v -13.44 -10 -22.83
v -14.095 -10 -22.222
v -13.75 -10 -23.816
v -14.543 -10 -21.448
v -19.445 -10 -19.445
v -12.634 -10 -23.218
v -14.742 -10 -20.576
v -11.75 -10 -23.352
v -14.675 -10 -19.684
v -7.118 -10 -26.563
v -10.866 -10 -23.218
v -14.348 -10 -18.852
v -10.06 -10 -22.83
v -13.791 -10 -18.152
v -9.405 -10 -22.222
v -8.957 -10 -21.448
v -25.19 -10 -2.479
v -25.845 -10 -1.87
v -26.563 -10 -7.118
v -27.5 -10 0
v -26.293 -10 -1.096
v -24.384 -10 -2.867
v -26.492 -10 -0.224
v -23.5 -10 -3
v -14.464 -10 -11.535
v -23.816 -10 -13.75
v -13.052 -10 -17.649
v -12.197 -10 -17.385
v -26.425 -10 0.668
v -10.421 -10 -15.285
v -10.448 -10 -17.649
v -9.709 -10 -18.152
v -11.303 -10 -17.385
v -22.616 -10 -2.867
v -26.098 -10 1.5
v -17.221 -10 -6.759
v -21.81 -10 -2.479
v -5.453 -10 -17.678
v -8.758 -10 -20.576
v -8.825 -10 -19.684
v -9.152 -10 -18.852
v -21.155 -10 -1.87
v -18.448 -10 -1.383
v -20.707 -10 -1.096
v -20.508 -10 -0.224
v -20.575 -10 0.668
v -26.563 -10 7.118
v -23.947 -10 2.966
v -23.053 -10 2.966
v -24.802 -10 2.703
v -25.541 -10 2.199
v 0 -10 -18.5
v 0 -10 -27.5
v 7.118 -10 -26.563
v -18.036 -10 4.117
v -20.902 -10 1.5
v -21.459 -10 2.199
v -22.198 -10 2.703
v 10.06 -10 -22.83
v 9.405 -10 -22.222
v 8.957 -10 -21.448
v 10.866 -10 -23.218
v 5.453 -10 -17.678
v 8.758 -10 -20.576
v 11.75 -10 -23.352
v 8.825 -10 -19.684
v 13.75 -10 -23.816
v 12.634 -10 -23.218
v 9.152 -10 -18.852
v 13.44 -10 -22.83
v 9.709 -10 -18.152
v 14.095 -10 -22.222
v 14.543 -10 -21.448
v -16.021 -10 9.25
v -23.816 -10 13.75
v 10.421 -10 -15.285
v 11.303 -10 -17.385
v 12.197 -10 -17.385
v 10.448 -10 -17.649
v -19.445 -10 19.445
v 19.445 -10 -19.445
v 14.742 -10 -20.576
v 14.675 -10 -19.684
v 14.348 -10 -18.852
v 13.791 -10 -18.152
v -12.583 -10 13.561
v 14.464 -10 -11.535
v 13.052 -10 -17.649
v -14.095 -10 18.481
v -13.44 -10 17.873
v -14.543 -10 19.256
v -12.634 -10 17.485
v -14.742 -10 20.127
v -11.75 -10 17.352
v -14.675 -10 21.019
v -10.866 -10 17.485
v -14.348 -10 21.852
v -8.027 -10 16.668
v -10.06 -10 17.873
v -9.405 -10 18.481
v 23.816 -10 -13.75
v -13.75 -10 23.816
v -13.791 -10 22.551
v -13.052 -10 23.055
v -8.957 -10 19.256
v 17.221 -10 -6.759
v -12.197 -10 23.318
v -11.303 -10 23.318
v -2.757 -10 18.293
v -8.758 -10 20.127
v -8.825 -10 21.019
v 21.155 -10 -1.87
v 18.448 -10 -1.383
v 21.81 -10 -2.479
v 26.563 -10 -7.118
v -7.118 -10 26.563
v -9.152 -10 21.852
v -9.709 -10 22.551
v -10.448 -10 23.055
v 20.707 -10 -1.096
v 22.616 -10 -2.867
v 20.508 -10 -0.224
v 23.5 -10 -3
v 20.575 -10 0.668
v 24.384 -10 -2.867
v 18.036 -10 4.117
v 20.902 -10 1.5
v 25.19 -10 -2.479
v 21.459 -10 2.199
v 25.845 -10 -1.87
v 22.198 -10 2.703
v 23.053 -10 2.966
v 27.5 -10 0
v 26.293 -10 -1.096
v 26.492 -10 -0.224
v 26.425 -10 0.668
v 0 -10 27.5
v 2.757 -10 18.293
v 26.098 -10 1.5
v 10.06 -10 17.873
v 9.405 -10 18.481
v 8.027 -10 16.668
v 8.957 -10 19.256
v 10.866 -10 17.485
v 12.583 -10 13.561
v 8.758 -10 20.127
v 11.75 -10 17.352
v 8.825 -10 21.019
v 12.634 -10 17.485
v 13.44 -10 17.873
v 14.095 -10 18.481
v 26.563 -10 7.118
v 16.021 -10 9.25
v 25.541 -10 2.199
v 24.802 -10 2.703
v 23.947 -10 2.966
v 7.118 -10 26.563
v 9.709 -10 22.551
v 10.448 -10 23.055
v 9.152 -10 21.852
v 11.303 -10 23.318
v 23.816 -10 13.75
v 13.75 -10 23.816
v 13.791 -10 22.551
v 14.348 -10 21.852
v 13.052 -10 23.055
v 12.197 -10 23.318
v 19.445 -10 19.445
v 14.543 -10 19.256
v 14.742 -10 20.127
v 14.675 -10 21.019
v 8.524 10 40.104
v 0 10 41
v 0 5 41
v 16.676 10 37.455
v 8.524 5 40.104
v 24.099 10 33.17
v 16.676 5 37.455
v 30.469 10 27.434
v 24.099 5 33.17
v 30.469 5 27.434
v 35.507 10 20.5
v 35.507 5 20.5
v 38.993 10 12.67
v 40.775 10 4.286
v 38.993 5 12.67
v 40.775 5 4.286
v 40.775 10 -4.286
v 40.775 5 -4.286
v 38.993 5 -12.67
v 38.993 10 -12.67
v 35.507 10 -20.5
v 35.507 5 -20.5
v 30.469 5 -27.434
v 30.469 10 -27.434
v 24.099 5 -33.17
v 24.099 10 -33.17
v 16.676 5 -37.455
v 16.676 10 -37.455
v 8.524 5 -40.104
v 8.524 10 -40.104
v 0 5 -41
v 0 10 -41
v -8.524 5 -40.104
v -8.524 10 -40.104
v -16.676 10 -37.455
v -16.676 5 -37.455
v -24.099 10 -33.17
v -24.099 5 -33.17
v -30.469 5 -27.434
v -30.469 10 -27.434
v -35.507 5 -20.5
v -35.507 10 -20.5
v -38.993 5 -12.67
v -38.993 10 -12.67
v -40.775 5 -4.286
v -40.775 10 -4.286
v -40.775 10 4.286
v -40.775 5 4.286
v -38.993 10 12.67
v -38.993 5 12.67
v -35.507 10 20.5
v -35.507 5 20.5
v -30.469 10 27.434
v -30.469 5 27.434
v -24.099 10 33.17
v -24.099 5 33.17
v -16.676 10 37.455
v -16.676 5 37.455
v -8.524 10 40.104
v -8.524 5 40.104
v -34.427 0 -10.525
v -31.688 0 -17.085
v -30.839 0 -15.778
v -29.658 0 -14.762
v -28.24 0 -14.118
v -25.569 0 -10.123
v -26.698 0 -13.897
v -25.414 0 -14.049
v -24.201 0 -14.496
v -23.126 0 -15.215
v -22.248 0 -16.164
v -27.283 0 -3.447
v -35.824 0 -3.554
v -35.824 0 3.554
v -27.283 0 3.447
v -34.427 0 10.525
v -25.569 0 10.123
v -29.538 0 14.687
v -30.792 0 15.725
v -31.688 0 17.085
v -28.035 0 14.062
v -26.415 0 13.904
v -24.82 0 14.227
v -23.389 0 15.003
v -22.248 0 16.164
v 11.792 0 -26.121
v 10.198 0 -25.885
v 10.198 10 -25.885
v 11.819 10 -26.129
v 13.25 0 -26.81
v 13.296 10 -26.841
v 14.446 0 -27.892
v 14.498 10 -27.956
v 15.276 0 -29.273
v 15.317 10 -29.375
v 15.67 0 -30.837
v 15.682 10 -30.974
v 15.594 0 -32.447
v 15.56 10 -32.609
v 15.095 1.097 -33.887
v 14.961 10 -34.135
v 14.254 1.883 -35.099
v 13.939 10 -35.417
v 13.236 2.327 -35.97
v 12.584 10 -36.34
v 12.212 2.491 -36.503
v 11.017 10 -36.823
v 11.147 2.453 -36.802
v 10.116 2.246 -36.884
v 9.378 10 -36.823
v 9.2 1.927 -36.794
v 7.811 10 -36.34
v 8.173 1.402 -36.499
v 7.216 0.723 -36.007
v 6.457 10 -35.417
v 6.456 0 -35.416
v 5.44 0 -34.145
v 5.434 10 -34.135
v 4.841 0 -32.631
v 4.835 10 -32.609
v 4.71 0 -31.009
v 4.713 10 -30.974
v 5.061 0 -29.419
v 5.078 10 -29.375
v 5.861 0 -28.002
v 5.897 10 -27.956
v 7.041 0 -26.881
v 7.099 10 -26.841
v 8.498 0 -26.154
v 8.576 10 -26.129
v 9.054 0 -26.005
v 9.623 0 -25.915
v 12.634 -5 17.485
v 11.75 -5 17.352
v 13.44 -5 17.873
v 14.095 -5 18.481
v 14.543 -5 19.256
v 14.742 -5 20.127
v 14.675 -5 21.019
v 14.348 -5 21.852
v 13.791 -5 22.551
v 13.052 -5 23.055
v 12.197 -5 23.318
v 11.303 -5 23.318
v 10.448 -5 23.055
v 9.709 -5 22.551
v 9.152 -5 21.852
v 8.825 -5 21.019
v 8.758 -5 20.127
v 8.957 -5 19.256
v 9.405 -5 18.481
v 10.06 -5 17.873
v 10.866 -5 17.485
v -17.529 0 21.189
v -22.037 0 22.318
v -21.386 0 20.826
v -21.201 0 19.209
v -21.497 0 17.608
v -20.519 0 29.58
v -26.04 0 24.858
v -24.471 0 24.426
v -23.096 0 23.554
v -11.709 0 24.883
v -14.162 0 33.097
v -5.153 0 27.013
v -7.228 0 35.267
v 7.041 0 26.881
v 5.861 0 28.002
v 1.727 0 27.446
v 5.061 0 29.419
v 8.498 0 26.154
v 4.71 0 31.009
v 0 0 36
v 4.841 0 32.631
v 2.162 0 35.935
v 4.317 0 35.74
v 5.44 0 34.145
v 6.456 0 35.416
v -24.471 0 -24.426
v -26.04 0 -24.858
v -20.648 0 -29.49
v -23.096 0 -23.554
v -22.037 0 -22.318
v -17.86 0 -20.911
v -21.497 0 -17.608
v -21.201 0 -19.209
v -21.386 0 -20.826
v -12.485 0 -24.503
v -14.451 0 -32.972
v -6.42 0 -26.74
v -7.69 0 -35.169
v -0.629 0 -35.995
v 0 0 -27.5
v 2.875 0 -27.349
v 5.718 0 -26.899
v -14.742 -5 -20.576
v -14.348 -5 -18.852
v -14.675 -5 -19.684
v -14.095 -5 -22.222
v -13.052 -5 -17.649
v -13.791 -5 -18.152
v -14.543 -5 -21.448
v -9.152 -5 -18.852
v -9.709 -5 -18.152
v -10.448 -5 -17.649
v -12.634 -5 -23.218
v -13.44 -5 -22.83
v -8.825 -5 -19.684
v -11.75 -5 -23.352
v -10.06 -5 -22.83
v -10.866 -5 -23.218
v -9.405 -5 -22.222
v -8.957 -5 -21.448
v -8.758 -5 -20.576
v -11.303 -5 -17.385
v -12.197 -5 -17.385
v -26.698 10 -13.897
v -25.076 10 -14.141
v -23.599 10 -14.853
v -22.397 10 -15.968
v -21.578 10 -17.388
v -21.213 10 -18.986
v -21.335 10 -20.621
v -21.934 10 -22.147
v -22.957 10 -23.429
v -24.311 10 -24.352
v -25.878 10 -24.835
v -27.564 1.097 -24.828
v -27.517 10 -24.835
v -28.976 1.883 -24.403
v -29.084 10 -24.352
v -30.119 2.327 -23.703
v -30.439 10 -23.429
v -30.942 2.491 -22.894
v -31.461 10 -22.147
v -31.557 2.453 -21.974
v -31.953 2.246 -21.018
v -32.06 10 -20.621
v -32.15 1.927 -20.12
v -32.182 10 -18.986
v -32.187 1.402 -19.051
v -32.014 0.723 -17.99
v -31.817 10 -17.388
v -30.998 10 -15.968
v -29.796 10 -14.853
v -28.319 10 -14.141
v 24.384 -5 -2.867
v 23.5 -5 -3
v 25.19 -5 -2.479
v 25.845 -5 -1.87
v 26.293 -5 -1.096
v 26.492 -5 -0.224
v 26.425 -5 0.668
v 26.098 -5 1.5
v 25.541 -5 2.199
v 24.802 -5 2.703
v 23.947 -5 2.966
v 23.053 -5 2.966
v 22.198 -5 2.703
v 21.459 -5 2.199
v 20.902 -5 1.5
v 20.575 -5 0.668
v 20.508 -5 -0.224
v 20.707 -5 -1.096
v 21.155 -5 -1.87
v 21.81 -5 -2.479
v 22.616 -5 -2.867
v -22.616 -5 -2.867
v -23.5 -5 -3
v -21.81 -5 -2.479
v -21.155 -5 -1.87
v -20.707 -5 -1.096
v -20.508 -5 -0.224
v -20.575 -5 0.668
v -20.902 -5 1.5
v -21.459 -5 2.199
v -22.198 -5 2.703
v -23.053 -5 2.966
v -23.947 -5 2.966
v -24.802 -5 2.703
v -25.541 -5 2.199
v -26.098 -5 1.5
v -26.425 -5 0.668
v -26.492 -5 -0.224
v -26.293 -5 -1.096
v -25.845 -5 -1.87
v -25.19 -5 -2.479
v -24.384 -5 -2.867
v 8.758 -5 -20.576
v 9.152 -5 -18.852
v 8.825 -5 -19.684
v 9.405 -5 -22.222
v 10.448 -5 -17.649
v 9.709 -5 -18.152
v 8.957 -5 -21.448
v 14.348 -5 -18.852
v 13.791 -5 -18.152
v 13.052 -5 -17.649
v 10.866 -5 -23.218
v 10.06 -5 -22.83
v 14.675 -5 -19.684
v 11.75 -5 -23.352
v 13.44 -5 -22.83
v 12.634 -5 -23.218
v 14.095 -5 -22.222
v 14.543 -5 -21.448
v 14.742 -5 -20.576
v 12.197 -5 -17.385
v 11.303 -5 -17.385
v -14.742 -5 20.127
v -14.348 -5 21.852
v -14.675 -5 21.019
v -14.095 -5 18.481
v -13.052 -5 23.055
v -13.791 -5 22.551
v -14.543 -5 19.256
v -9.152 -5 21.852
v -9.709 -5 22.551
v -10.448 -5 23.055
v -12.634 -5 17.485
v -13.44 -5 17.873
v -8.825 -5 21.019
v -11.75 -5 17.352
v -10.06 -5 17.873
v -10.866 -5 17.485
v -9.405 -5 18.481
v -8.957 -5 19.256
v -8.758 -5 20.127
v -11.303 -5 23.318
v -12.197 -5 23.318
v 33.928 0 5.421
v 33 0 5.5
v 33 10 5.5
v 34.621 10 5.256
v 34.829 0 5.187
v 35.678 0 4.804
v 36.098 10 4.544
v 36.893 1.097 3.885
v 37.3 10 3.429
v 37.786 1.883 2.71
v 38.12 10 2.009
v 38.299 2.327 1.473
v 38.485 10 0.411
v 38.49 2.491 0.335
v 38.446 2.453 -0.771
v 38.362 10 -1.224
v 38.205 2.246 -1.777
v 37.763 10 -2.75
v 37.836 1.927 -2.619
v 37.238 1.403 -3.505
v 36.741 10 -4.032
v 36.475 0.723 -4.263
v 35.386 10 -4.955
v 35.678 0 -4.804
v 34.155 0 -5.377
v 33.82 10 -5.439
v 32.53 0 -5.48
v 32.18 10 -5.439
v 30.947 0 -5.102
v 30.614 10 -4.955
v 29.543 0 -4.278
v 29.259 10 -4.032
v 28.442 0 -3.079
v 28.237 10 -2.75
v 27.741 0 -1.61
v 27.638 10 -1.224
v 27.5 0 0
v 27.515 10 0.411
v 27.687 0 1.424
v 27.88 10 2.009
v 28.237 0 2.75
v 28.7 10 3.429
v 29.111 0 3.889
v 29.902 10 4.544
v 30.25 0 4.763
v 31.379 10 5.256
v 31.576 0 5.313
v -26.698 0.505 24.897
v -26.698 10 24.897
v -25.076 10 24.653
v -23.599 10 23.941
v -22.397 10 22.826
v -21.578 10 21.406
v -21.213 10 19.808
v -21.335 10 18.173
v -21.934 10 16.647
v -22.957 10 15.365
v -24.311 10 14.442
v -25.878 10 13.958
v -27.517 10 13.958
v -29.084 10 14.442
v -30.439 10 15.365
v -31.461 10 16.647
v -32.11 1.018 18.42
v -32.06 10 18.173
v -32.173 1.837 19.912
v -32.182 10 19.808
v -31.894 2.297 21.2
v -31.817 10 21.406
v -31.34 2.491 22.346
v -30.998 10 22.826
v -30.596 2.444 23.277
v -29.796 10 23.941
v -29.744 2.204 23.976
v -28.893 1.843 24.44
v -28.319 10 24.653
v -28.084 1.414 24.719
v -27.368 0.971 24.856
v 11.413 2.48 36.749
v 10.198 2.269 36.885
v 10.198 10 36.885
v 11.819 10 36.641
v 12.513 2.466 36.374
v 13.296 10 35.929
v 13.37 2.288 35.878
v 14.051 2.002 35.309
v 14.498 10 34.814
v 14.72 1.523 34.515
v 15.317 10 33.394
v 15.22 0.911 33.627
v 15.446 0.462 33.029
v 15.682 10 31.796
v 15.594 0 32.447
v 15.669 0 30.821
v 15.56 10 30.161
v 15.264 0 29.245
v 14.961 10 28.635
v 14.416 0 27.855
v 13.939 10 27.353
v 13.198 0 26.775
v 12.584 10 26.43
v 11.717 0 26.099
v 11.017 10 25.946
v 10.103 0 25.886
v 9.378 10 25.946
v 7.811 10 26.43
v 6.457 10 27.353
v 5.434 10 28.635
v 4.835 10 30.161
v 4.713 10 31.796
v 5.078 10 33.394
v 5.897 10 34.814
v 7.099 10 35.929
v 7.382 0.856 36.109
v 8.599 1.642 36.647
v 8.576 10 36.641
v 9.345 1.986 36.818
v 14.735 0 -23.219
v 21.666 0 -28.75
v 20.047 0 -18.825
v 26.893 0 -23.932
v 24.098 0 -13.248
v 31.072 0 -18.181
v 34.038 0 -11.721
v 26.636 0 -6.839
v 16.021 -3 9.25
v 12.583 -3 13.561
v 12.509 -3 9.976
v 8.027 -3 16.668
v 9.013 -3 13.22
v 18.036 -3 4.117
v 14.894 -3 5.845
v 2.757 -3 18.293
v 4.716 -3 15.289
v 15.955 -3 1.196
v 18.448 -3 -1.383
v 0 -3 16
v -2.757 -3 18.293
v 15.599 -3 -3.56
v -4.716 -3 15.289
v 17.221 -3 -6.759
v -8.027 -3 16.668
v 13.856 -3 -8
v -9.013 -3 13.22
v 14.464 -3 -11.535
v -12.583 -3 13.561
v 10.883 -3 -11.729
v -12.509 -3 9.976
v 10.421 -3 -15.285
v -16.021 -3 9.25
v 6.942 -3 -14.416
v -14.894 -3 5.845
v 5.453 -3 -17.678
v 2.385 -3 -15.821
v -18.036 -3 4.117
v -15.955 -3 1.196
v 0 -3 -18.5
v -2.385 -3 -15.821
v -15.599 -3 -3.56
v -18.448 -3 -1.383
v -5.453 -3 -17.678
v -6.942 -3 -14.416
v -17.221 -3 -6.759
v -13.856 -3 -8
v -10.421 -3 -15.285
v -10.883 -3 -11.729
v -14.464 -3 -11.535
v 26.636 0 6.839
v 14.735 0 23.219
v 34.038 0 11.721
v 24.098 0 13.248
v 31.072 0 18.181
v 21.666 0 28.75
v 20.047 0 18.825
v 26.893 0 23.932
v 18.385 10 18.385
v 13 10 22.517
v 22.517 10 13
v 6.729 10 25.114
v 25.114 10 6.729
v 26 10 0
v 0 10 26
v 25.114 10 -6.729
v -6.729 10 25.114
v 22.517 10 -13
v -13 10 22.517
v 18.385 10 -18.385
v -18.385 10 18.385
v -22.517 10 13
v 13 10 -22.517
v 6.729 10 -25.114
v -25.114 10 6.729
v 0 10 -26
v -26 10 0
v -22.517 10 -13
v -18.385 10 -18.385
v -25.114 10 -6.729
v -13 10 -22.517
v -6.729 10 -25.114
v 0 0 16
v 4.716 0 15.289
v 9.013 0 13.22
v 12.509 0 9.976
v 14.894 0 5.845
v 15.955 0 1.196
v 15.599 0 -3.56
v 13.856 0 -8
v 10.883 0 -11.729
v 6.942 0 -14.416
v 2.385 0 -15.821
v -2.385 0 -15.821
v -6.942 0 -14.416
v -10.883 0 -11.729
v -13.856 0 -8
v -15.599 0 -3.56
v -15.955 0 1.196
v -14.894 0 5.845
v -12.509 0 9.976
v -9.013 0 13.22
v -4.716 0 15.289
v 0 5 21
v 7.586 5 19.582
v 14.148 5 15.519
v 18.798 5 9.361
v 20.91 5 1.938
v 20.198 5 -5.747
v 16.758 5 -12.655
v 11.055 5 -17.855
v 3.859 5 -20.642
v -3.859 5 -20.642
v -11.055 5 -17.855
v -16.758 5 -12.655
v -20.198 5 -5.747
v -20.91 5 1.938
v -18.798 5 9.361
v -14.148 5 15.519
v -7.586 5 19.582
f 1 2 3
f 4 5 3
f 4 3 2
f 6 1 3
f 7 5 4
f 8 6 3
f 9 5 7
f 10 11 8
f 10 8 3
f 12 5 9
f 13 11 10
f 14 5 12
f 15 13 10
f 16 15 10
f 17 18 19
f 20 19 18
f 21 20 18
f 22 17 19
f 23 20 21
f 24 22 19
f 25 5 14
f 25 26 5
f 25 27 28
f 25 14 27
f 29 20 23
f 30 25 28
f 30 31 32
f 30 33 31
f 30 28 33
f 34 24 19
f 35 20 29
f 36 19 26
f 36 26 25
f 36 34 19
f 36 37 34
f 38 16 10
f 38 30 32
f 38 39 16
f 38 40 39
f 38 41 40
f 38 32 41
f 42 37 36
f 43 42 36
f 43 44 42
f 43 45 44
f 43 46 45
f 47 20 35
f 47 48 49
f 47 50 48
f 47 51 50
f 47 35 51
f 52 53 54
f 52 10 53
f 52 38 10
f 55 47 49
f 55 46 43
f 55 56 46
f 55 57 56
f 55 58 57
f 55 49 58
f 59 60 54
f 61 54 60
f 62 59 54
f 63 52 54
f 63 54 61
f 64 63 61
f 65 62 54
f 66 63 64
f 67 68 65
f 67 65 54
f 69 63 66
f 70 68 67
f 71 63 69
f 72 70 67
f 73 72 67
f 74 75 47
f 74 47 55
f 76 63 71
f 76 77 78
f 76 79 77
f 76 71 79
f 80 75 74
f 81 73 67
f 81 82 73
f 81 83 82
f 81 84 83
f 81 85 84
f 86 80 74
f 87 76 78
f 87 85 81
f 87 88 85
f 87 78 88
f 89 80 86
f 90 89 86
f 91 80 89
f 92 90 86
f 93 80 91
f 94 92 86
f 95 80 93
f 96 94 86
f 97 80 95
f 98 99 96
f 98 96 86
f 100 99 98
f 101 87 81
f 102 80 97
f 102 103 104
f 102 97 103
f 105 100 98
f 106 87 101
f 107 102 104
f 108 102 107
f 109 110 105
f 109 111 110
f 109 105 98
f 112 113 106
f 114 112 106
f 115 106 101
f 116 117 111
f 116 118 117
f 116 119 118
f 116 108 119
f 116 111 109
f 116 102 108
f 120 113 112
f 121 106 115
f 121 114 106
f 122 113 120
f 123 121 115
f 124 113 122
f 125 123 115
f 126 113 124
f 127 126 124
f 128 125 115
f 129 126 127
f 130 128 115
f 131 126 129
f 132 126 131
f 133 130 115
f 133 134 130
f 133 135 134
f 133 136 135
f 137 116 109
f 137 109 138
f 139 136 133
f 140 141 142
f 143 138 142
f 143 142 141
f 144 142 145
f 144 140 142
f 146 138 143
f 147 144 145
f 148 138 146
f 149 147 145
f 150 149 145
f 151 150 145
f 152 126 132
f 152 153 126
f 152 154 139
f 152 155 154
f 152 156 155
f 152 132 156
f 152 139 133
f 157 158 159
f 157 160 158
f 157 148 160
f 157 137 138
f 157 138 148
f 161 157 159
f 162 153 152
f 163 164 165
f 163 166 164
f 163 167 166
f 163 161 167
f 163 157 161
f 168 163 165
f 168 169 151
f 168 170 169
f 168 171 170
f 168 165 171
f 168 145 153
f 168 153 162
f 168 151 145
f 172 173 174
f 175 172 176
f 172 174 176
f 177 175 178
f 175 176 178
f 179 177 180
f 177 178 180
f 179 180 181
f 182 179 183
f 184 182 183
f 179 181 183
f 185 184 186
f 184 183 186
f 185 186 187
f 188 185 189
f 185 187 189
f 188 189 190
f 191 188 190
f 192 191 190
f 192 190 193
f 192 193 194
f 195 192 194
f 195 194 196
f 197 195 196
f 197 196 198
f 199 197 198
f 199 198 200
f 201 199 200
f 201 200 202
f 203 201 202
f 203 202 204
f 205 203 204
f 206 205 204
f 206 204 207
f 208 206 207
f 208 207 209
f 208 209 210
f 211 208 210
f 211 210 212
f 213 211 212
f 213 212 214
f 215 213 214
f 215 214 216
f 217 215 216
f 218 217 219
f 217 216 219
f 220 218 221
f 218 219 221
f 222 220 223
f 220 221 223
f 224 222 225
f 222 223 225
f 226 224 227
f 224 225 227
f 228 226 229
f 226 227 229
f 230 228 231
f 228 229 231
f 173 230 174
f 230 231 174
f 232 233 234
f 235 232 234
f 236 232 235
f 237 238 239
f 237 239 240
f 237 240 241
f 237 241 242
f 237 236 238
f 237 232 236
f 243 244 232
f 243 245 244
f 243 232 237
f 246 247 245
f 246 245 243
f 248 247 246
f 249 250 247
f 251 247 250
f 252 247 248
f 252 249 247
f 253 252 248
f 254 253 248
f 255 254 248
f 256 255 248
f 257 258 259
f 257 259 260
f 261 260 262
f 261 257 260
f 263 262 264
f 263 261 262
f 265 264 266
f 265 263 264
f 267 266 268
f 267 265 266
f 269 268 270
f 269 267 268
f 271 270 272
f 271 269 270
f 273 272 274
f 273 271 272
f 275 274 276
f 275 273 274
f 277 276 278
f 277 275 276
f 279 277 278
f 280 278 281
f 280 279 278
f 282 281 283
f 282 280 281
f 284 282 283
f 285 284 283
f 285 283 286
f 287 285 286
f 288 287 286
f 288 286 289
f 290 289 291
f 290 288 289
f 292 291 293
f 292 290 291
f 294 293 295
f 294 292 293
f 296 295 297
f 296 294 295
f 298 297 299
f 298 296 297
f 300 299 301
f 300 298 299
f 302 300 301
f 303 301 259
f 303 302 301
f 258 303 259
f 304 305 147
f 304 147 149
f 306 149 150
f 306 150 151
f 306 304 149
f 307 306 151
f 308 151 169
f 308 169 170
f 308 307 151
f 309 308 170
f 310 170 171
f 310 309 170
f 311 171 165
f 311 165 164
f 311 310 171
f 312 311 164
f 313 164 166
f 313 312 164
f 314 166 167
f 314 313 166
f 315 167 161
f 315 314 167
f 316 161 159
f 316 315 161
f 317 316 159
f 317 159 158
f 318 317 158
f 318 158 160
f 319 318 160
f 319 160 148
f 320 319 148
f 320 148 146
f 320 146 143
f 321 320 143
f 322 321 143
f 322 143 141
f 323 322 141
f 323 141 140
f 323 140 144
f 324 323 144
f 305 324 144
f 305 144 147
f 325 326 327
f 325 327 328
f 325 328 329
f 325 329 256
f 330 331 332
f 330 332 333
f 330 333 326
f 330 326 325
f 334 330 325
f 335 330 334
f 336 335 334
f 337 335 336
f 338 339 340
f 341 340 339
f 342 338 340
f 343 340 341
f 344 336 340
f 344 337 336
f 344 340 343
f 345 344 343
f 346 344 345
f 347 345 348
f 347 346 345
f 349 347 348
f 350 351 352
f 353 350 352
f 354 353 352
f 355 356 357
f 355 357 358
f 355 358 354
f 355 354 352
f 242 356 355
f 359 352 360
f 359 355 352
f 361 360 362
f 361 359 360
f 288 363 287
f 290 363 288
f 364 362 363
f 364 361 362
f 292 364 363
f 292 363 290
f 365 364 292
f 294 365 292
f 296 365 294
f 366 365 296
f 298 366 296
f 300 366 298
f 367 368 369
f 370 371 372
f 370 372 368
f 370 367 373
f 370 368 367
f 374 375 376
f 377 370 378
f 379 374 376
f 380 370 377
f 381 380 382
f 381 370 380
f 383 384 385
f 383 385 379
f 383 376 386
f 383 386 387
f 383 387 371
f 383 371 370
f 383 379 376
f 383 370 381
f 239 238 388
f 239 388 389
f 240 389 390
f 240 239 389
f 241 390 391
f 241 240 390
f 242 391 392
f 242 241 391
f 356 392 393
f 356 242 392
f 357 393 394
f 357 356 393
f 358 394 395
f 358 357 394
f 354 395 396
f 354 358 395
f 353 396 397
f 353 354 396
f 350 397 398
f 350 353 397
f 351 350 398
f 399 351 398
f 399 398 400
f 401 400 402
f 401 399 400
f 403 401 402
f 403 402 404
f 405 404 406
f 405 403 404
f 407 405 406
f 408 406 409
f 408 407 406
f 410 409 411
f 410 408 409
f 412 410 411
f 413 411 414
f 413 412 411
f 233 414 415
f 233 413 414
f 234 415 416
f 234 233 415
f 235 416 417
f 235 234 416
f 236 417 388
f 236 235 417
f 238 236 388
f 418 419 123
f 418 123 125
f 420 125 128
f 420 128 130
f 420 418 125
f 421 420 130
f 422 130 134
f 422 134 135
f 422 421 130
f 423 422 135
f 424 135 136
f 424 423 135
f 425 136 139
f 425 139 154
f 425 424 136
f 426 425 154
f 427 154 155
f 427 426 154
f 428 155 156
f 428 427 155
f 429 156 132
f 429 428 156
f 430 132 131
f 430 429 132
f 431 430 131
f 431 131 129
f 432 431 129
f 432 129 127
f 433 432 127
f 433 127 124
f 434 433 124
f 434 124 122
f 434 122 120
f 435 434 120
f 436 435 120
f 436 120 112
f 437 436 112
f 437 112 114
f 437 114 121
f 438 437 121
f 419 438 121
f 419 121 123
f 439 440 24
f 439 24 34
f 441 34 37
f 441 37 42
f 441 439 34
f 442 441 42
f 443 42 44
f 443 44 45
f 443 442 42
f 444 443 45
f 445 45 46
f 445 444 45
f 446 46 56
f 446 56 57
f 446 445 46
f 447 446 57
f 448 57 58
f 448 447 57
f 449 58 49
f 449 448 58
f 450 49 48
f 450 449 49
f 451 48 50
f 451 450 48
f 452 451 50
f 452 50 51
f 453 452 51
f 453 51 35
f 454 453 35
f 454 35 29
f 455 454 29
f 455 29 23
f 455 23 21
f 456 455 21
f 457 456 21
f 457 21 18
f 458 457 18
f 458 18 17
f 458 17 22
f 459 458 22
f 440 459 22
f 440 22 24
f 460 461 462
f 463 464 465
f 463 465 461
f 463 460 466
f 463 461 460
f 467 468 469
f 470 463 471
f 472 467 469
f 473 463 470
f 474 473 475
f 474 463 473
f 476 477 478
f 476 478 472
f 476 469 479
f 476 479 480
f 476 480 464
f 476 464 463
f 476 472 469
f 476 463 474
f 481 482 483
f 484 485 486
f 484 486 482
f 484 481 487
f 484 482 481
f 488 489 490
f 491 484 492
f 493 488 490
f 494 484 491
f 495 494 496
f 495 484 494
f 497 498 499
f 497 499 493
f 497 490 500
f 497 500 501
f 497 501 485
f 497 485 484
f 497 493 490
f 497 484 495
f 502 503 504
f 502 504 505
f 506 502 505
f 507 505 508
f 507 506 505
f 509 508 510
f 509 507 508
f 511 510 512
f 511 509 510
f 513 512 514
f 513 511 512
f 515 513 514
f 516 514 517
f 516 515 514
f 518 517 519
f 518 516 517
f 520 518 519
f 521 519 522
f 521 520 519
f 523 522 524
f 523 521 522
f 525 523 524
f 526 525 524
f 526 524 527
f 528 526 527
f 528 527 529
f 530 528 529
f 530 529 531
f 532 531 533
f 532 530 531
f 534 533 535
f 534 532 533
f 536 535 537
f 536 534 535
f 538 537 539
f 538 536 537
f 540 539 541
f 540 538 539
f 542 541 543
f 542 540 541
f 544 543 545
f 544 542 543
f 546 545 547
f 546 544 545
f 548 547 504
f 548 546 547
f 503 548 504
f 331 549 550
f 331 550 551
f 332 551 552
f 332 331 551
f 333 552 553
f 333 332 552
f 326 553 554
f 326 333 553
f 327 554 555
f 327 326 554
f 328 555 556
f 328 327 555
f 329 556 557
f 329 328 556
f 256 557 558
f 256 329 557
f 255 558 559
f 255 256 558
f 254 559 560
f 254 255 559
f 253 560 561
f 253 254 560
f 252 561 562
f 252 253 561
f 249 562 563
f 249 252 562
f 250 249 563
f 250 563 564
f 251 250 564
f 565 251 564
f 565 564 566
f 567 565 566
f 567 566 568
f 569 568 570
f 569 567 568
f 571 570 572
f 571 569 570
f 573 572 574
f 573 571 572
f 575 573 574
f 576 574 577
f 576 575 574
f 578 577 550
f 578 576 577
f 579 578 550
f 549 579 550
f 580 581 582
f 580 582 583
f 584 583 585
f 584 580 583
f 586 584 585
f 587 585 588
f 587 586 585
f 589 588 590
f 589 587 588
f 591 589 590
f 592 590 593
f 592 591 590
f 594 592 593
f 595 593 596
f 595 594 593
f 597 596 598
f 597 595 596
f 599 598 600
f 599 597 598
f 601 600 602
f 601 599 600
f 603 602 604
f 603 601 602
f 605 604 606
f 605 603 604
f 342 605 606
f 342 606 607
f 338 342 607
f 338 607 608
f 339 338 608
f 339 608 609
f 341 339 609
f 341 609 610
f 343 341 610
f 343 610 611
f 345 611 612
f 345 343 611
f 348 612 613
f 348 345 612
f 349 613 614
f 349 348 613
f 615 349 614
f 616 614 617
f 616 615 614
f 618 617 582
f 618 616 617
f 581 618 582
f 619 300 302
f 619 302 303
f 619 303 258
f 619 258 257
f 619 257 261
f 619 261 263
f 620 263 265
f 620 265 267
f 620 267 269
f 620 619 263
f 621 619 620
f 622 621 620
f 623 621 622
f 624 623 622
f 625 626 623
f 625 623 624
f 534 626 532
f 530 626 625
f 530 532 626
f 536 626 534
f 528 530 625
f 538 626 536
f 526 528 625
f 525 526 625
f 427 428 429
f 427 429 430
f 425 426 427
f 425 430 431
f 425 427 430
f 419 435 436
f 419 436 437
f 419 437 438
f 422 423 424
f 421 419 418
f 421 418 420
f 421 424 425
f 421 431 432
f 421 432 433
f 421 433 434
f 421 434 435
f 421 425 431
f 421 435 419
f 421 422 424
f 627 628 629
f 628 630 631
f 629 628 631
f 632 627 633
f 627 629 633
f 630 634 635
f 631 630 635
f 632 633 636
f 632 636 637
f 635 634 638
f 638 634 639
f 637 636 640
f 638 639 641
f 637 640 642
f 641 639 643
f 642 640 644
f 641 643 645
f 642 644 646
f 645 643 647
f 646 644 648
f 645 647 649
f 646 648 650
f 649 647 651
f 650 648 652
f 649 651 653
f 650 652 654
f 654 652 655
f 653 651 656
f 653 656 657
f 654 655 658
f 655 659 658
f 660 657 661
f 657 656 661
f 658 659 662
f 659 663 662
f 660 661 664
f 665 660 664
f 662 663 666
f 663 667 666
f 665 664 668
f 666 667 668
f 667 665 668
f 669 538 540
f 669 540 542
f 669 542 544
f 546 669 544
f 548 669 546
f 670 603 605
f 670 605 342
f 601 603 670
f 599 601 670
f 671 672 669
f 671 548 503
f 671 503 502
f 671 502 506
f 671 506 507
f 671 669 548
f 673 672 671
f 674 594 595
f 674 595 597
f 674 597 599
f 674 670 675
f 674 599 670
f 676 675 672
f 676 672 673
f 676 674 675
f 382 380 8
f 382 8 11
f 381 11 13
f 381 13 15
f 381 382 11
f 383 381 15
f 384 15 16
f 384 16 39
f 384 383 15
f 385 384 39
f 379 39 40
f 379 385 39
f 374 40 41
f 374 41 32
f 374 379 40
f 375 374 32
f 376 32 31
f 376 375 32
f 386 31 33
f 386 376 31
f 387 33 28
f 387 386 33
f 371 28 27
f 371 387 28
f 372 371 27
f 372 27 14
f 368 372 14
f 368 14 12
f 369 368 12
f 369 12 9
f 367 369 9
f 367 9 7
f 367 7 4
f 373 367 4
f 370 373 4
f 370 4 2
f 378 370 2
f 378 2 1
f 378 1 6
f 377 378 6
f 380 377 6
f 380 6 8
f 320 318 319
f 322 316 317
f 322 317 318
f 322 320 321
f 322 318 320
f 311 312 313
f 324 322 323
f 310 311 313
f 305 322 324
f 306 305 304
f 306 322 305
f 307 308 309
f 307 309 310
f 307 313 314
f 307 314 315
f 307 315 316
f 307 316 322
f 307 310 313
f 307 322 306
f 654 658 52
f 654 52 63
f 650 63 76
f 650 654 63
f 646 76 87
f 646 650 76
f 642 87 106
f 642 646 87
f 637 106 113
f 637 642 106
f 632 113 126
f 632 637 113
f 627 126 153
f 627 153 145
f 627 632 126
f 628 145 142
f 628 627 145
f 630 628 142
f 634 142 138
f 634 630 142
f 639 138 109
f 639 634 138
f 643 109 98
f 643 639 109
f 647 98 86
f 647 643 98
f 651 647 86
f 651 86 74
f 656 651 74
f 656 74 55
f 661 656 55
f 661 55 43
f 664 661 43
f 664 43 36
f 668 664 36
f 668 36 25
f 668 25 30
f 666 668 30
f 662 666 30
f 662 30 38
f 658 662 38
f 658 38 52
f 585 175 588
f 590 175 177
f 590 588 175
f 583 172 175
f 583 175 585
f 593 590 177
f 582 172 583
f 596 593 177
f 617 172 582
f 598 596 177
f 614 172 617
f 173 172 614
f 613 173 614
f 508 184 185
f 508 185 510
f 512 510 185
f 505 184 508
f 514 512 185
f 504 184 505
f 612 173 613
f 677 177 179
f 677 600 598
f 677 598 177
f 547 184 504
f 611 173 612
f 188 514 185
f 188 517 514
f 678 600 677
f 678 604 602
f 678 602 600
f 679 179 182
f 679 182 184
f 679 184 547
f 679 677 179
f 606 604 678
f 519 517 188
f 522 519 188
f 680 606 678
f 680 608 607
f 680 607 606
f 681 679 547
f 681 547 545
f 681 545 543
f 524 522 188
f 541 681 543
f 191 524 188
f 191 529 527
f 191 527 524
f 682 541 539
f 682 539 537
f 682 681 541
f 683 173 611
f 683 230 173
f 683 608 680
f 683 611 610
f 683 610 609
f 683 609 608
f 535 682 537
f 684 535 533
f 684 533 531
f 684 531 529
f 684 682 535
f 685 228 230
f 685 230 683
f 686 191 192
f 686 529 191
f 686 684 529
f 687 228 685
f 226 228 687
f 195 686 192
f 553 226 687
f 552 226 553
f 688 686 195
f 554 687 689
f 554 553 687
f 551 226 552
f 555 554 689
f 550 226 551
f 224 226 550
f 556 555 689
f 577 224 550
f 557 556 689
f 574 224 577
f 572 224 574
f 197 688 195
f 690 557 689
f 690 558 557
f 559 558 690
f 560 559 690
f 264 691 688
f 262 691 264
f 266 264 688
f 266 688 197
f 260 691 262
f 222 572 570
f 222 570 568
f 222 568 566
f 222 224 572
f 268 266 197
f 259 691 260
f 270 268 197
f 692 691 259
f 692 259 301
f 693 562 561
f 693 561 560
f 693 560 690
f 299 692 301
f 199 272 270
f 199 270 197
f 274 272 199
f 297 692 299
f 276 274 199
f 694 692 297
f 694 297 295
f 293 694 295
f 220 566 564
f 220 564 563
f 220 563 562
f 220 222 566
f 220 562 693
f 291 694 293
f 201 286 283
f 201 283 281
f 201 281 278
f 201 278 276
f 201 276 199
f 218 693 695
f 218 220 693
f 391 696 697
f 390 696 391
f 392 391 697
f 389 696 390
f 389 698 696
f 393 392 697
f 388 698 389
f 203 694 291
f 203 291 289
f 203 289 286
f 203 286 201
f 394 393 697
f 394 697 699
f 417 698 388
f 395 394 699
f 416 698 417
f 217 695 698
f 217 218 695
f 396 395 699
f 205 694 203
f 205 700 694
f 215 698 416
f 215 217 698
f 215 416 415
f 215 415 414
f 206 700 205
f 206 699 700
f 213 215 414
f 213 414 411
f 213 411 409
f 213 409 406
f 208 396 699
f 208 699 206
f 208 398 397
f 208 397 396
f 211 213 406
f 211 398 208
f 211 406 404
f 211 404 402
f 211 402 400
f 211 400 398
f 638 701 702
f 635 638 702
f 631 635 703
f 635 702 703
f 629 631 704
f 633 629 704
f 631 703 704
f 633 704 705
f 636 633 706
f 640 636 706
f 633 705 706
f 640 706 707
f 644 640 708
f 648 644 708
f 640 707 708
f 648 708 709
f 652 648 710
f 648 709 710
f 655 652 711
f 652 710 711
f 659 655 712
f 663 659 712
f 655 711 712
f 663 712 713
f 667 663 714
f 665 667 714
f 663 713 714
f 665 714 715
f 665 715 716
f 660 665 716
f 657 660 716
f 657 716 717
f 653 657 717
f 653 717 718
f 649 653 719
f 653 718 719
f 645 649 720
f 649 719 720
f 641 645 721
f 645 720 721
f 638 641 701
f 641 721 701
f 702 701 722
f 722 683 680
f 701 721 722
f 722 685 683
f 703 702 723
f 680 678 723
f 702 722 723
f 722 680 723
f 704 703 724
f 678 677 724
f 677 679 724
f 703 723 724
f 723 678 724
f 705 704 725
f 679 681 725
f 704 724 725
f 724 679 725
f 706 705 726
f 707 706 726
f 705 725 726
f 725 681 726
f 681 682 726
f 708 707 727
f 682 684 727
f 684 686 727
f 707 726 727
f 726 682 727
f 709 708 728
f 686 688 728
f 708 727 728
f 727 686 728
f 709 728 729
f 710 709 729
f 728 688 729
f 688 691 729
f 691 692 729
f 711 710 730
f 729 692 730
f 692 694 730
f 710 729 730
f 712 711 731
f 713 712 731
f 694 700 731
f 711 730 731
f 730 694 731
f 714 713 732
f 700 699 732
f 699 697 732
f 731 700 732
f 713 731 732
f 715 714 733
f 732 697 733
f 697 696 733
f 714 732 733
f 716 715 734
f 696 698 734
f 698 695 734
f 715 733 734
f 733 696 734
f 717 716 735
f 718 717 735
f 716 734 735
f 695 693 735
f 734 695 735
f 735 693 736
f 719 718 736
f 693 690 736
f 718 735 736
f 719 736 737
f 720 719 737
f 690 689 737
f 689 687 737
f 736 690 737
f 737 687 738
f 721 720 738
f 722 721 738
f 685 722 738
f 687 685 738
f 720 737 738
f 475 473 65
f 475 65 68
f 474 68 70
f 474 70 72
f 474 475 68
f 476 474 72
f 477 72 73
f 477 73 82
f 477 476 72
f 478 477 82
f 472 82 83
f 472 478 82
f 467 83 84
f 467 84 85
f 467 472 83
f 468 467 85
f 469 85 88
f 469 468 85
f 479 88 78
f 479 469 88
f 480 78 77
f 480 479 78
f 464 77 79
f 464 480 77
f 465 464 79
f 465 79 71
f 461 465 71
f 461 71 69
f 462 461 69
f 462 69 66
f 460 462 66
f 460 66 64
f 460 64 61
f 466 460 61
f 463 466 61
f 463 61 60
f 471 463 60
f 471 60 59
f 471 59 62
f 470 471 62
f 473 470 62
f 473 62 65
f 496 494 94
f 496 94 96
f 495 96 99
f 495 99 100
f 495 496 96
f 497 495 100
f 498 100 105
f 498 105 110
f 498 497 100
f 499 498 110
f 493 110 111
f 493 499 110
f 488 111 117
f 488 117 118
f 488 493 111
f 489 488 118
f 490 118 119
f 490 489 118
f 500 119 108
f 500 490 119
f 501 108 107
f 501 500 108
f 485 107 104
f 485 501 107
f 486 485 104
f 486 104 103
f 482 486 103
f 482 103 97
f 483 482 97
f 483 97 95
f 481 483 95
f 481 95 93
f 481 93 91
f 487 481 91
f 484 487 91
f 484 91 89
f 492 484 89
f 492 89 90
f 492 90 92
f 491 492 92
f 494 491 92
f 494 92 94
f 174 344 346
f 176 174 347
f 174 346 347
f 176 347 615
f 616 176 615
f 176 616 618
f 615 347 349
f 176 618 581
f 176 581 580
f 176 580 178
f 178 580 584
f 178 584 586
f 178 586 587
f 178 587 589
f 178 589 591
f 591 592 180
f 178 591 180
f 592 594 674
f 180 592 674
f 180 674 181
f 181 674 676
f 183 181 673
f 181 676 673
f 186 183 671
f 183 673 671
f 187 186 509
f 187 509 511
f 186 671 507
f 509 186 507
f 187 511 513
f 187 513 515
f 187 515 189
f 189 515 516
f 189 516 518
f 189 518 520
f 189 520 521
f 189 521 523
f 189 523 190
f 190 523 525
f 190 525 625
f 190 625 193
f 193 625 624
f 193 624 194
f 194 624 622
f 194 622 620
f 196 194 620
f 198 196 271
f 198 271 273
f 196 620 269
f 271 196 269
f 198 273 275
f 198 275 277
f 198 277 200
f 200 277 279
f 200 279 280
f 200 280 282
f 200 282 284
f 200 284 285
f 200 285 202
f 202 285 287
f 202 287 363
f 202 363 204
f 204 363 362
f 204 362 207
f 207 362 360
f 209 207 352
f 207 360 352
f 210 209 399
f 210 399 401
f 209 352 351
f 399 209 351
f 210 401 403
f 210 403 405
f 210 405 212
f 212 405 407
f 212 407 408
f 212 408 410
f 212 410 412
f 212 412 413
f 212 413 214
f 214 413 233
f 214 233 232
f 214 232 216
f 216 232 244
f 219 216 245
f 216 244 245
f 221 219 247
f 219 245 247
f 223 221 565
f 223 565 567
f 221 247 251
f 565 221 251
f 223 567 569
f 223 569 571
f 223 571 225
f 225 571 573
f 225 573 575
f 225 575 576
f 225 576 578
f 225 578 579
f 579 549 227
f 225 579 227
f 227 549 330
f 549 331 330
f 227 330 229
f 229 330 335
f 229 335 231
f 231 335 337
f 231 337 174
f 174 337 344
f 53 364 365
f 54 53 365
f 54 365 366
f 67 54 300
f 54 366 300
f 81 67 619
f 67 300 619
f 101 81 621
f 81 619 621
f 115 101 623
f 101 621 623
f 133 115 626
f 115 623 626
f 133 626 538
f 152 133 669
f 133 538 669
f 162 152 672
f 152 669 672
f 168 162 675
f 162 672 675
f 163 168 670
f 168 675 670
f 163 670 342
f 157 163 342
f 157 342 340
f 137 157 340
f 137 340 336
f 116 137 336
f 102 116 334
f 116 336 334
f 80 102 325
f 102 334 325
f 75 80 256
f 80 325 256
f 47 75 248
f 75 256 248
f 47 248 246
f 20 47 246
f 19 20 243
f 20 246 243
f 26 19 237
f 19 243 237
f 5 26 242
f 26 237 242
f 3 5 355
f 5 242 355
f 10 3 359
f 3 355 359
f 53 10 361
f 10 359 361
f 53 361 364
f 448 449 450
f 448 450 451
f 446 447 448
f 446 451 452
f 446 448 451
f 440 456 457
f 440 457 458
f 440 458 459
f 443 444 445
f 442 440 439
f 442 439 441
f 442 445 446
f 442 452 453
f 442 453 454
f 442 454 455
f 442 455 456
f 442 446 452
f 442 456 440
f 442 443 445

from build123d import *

# Parameters (mm, degrees)
SKETCH1_R                = 41
SKETCH1_R_2              = 5.5
SKETCH1_R_3              = 25
BOSS_EXTRUDE1_DEPTH      = 10
SKETCH2_R                = 25
SKETCH2_R_2              = 22.5
BOSS_EXTRUDE2_DEPTH      = 10
BOSS_EXTRUDE4_DEPTH      = 10
BOSS_EXTRUDE4_DEPTH_BACK = 10
SKETCH4_R                = 27.5
SKETCH4_R_2              = 19.5
SKETCH4_R_3              = 3
BOSS_EXTRUDE5_START      = -10
BOSS_EXTRUDE5_DEPTH      = 10
BOSS_EXTRUDE6_START      = -10
SKETCH6_R                = 3
BOSS_EXTRUDE6_DEPTH      = 5
CHAMFER2_SIZE            = 5
BOSS_EXTRUDE7_START      = -20
SKETCH7_R                = 19.5
SKETCH7_R_2              = 18.5
BOSS_EXTRUDE7_DEPTH      = 20
SKETCH8_R                = 18.5
SKETCH8_R_2              = 16
BOSS_EXTRUDE8_DEPTH      = 13
CHAMFER4_SIZE            = 10


with BuildPart() as part:
    # Sketch1 → Boss-Extrude1 (new body)
    with BuildSketch(Plane(origin=(0, 0, 0), x_dir=(1, 0, 0), z_dir=(0, 1, 0))):
        with Locations(Location((0, 0, 0), (0, 0, 270))):
            Circle(SKETCH1_R)
        with Locations(Location((33, 0, 0), (0, 0, 270))):
            Circle(SKETCH1_R_2, mode=Mode.SUBTRACT)
        with Locations(Location((10.197560814, -31.384865038, 0), (0, 0, 270))):
            Circle(SKETCH1_R_2, mode=Mode.SUBTRACT)
        with Locations(Location((-26.697560814, -19.396913326, 0), (0, 0, 270))):
            Circle(SKETCH1_R_2, mode=Mode.SUBTRACT)
        with Locations(Location((-26.697560814, 19.396913326, 0), (0, 0, 270))):
            Circle(SKETCH1_R_2, mode=Mode.SUBTRACT)
        with Locations(Location((10.197560814, 31.384865038, 0), (0, 0, 270))):
            Circle(SKETCH1_R_2, mode=Mode.SUBTRACT)
        with Locations(Location((0, 0, 0), (0, 0, 270))):
            Circle(SKETCH1_R_3, mode=Mode.SUBTRACT)
    extrude(amount=BOSS_EXTRUDE1_DEPTH)

    # Sketch2 → Boss-Extrude2 (add)
    with BuildSketch(Plane.XZ):
        Circle(SKETCH2_R)
        with Locations(Location((0, 0, 0), (0, 0, 270))):
            Circle(SKETCH2_R_2, mode=Mode.SUBTRACT)
    extrude(amount=-BOSS_EXTRUDE2_DEPTH)

    # Sketch4 → Boss-Extrude4 (add, two sides: drawn at the far end of the back side and taken through both)
    with BuildSketch(Plane.XZ.offset(-BOSS_EXTRUDE4_DEPTH_BACK)):
        with Locations(Location((0, 0, 0), (0, 0, 270))):
            Circle(SKETCH4_R)
        with Locations(Location((0, 0, 0), (0, 0, 270))):
            Circle(SKETCH4_R_2, mode=Mode.SUBTRACT)
        with Locations(Location((23.5, 0, 0), (0, 0, 270))):
            Circle(SKETCH4_R_3, mode=Mode.SUBTRACT)
        with Locations(Location((11.75, -20.351596989, 0), (0, 0, 270))):
            Circle(SKETCH4_R_3, mode=Mode.SUBTRACT)
        with Locations(Location((-11.75, -20.351596989, 0), (0, 0, 270))):
            Circle(SKETCH4_R_3, mode=Mode.SUBTRACT)
        with Locations(Location((-23.5, 0, 0), (0, 0, 270))):
            Circle(SKETCH4_R_3, mode=Mode.SUBTRACT)
        with Locations(Location((-11.75, 20.351596989, 0), (0, 0, 270))):
            Circle(SKETCH4_R_3, mode=Mode.SUBTRACT)
        with Locations(Location((11.75, 20.351596989, 0), (0, 0, 270))):
            Circle(SKETCH4_R_3, mode=Mode.SUBTRACT)
    extrude(amount=BOSS_EXTRUDE4_DEPTH + BOSS_EXTRUDE4_DEPTH_BACK)

    # Sketch5 → Boss-Extrude5 (add)
    with BuildSketch(Plane(origin=(0, 10, 0), x_dir=(1, 0, 0), z_dir=(0, 1, 0)).offset(BOSS_EXTRUDE5_START)):
        with BuildLine():
            ThreePointArc((-13.557162741, 17.956985783), (-10.25, 17.753520778), (-8.772624493, 20.719340229))
            ThreePointArc((-8.772624493, 20.719340229), (-11.25, 19.485571585), (-13.557162741, 17.956985783))
        make_face()
        with BuildLine():
            ThreePointArc((-22.329787234, 2.762354445), (-22.5, 0), (-22.329787234, -2.762354445))
            ThreePointArc((-22.329787234, -2.762354445), (-20.5, 0), (-22.329787234, 2.762354445))
        make_face()
        with BuildLine():
            ThreePointArc((8.772624493, 20.719340229), (10.25, 17.753520778), (13.557162741, 17.956985783))
            ThreePointArc((13.557162741, 17.956985783), (11.25, 19.485571585), (8.772624493, 20.719340229))
        make_face()
        with BuildLine():
            ThreePointArc((22.329787234, 2.762354445), (20.5, 0), (22.329787234, -2.762354445))
            ThreePointArc((22.329787234, -2.762354445), (22.5, 0), (22.329787234, 2.762354445))
        make_face()
        with BuildLine():
            ThreePointArc((13.557162741, -17.956985783), (10.25, -17.753520778), (8.772624493, -20.719340229))
            ThreePointArc((8.772624493, -20.719340229), (11.25, -19.485571585), (13.557162741, -17.956985783))
        make_face()
        with BuildLine():
            ThreePointArc((-8.772624493, -20.719340229), (-10.25, -17.753520778), (-13.557162741, -17.956985783))
            ThreePointArc((-13.557162741, -17.956985783), (-11.25, -19.485571585), (-8.772624493, -20.719340229))
        make_face()
    extrude(amount=BOSS_EXTRUDE5_DEPTH)

    # Sketch6 → Boss-Extrude6 (add)
    with BuildSketch(Plane.XZ.offset(10).offset(BOSS_EXTRUDE6_START)):
        with Locations(Location((-23.5, 0, 0), (0, 0, 270))):
            Circle(SKETCH6_R)
        with Locations(Location((-11.75, 20.351596989, 0), (0, 0, 270))):
            Circle(SKETCH6_R)
        with Locations(Location((11.75, 20.351596989, 0), (0, 0, 270))):
            Circle(SKETCH6_R)
        with Locations(Location((23.5, 0, 0), (0, 0, 270))):
            Circle(SKETCH6_R)
        with Locations(Location((11.75, -20.351596989, 0), (0, 0, 270))):
            Circle(SKETCH6_R)
        with Locations(Location((-11.75, -20.351596989, 0), (0, 0, 270))):
            Circle(SKETCH6_R)
    extrude(amount=BOSS_EXTRUDE6_DEPTH)

    # Chamfer2
    # the kernel refuses this chamfer: 5 mm, written as the material it takes off along each edge
    with BuildSketch(Plane(origin=(0, 0, 0), x_dir=(0, 0, 1), z_dir=(-1, 0, 0))) as chamfer2_piece_1:
        Polygon((41, CHAMFER2_SIZE), (41 - CHAMFER2_SIZE, 0), (41, 0), align=None)
    revolve(axis=Axis((0, 0, 0), (0, 1, 0)), mode=Mode.SUBTRACT)

    # Sketch7 → Boss-Extrude7 (add)
    with BuildSketch(Plane.XZ.offset(10).offset(BOSS_EXTRUDE7_START)):
        Circle(SKETCH7_R)
        with Locations(Location((0, 0, 0), (0, 0, 270))):
            Circle(SKETCH7_R_2, mode=Mode.SUBTRACT)
    extrude(amount=BOSS_EXTRUDE7_DEPTH)

    # Sketch8 → Boss-Extrude8 (add)
    with BuildSketch(Plane(origin=(0, 10, 0), x_dir=(1, 0, 0), z_dir=(0, 1, 0))):
        with Locations(Location((0, 0, 0), (0, 0, 90))):
            Circle(SKETCH8_R)
        with Locations(Location((0, 0, 0), (0, 0, 270))):
            Circle(SKETCH8_R_2, mode=Mode.SUBTRACT)
    extrude(amount=-BOSS_EXTRUDE8_DEPTH)

    # Chamfer4
    chamfer4_edges = [part.edges().sort_by_distance(p)[0] for p in [
        (0, 10, -16),
    ]]
    chamfer(chamfer4_edges, length=CHAMFER4_SIZE)


solid = part.part
